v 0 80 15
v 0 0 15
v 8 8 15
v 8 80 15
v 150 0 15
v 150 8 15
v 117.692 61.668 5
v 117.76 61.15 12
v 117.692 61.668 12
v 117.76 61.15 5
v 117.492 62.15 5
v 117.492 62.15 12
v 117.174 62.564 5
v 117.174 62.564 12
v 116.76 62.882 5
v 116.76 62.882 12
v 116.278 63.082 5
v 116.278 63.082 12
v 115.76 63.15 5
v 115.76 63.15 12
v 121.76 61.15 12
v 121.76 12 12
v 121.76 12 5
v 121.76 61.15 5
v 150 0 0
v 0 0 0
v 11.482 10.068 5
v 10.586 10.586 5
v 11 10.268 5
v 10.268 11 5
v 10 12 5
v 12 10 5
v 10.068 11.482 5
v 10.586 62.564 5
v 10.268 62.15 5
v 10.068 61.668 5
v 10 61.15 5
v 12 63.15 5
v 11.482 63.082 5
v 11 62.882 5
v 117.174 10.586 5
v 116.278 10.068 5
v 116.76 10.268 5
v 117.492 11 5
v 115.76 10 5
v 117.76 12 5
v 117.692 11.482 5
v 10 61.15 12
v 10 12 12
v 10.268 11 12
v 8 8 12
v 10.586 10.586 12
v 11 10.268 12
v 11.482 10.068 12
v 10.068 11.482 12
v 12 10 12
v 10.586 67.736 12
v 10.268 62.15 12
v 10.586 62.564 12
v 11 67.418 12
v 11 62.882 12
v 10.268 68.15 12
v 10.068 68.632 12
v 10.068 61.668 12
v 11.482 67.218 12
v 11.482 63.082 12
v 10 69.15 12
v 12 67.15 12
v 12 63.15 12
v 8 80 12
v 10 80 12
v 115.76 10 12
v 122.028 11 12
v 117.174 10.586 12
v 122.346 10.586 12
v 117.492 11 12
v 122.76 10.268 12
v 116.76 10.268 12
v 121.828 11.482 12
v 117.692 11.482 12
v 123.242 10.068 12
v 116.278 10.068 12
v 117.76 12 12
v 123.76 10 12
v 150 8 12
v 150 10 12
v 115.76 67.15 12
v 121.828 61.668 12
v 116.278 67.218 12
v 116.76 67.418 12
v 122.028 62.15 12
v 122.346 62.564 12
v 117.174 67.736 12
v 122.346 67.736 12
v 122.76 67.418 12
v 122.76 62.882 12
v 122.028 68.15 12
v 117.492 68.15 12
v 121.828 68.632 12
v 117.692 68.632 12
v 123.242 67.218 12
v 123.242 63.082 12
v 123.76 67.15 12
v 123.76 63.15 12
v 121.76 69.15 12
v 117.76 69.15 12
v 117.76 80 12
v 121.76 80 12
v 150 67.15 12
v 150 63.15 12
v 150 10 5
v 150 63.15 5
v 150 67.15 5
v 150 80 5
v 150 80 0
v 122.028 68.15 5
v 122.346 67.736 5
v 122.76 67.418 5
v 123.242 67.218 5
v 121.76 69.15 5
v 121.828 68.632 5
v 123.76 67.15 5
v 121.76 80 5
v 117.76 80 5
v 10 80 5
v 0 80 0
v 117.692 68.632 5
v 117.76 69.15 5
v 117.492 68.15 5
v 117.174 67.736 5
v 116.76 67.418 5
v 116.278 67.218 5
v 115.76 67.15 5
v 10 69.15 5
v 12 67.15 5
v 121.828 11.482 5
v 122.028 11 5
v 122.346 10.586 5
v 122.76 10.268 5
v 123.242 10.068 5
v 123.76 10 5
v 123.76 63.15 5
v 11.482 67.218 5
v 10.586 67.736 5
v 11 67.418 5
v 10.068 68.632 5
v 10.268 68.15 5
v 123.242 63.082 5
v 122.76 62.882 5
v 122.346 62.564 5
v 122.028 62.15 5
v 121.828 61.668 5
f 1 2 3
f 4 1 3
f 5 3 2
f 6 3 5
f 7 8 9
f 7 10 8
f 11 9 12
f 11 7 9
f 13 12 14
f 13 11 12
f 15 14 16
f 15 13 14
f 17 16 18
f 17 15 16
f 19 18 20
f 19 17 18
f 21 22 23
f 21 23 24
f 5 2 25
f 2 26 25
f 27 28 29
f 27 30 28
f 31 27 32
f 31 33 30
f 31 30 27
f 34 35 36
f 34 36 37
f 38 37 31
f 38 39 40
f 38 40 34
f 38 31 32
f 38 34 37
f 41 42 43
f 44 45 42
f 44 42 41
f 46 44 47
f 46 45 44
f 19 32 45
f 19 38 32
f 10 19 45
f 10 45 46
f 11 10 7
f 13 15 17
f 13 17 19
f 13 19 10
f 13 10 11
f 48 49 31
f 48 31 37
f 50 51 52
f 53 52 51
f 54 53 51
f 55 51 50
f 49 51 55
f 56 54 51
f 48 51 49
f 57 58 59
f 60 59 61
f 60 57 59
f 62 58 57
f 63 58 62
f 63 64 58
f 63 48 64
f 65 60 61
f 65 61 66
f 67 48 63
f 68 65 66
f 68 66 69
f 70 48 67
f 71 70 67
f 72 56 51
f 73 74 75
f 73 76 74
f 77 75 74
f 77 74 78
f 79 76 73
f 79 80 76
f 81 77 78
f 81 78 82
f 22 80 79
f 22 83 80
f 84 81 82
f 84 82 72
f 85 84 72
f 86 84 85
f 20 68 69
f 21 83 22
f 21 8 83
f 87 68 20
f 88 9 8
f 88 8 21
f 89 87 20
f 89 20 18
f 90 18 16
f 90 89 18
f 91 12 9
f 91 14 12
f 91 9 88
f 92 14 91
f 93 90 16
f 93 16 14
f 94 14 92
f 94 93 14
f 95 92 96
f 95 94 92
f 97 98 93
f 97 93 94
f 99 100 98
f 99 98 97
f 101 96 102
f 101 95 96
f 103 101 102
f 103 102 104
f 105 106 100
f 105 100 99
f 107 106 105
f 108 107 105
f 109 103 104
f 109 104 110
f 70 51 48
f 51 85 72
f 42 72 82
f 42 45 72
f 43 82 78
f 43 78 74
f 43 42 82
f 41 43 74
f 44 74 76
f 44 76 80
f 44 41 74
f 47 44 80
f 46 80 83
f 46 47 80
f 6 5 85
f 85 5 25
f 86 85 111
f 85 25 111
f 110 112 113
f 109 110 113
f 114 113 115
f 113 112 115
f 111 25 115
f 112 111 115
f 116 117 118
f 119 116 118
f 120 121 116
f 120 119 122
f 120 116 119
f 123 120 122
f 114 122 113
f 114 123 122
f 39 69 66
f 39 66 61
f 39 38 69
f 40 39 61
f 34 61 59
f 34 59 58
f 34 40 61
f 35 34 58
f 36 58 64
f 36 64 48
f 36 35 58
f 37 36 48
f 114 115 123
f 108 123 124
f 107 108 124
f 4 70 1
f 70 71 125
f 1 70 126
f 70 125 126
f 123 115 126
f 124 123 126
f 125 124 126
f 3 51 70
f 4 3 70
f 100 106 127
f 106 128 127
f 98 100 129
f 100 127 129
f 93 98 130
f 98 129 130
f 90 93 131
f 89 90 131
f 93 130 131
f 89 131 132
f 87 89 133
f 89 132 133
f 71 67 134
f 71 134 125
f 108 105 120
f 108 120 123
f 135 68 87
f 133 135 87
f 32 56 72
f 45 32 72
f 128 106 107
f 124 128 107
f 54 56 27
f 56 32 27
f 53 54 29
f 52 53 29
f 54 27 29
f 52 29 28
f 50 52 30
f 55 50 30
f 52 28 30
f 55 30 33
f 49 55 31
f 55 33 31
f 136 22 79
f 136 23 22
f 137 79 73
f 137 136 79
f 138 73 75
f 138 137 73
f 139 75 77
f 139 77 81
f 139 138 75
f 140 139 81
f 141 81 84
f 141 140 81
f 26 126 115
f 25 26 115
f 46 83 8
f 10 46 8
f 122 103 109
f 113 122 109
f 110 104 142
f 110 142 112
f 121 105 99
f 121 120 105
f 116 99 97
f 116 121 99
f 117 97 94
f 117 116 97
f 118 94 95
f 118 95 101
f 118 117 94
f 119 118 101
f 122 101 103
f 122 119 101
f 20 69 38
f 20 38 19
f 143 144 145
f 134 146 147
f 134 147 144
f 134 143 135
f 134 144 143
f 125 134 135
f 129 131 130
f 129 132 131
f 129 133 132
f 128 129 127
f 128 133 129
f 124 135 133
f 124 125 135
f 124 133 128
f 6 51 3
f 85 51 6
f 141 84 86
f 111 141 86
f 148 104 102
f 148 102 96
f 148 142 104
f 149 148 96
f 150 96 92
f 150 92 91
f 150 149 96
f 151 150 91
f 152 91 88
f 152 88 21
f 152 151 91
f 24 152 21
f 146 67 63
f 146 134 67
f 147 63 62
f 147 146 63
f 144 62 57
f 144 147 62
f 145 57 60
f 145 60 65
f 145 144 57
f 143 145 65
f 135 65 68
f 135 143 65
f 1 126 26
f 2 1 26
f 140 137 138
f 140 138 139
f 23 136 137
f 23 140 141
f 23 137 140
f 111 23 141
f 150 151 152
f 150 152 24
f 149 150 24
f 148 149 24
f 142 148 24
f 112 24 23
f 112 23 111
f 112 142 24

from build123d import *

# Parameters (mm, degrees)
F0_W     = 150
F0_H     = 80
F1_DEPTH = 12
F2_W     = 142
F2_H     = 8
F3_DEPTH = 3
F4_W     = 107.76
F4_H     = 12.85
F4_H_2   = 53.15
F4_W_2   = 28.24
F5_DEPTH = 7
F6_R     = 2


with BuildPart() as f1:
    # F0 (on Top) → F1 (new body)
    with BuildSketch(Plane.XY):
        with Locations((75, 40)):
            Rectangle(F0_W, F0_H)
    extrude(amount=F1_DEPTH)

    # F2 (on face) → F3 (join)
    with BuildSketch(Plane.XY.offset(12)):
        Polygon((0, 80), (0, 0), (8, 0), (8, 8), (8, 80), align=None)
        with Locations((79, 4)):
            Rectangle(F2_W, F2_H)
    extrude(amount=F3_DEPTH)

    # F4 (on face) → F5 (cut)
    with BuildSketch(Plane.XY.offset(12)):
        with Locations((63.88, 73.575)):
            Rectangle(F4_W, F4_H)
        with Locations((63.88, 36.575)):
            Rectangle(F4_W, F4_H_2)
        with Locations((135.88, 36.575)):
            Rectangle(F4_W_2, F4_H_2)
        with Locations((135.88, 73.575)):
            Rectangle(F4_W_2, F4_H)
    extrude(amount=-F5_DEPTH, mode=Mode.SUBTRACT)

    # F6
    f6_edges = [f1.edges().sort_by_distance(p)[0] for p in [
        (10, 63.15, 8.5),
        (117.76, 63.15, 8.5),
        (121.76, 63.15, 8.5),
        (121.76, 67.15, 8.5),
        (117.76, 67.15, 8.5),
        (117.76, 10, 8.5),
        (10, 10, 8.5),
        (10, 67.15, 8.5),
        (121.76, 10, 8.5),
    ]]
    fillet(f6_edges, radius=F6_R)


solid = f1.part
